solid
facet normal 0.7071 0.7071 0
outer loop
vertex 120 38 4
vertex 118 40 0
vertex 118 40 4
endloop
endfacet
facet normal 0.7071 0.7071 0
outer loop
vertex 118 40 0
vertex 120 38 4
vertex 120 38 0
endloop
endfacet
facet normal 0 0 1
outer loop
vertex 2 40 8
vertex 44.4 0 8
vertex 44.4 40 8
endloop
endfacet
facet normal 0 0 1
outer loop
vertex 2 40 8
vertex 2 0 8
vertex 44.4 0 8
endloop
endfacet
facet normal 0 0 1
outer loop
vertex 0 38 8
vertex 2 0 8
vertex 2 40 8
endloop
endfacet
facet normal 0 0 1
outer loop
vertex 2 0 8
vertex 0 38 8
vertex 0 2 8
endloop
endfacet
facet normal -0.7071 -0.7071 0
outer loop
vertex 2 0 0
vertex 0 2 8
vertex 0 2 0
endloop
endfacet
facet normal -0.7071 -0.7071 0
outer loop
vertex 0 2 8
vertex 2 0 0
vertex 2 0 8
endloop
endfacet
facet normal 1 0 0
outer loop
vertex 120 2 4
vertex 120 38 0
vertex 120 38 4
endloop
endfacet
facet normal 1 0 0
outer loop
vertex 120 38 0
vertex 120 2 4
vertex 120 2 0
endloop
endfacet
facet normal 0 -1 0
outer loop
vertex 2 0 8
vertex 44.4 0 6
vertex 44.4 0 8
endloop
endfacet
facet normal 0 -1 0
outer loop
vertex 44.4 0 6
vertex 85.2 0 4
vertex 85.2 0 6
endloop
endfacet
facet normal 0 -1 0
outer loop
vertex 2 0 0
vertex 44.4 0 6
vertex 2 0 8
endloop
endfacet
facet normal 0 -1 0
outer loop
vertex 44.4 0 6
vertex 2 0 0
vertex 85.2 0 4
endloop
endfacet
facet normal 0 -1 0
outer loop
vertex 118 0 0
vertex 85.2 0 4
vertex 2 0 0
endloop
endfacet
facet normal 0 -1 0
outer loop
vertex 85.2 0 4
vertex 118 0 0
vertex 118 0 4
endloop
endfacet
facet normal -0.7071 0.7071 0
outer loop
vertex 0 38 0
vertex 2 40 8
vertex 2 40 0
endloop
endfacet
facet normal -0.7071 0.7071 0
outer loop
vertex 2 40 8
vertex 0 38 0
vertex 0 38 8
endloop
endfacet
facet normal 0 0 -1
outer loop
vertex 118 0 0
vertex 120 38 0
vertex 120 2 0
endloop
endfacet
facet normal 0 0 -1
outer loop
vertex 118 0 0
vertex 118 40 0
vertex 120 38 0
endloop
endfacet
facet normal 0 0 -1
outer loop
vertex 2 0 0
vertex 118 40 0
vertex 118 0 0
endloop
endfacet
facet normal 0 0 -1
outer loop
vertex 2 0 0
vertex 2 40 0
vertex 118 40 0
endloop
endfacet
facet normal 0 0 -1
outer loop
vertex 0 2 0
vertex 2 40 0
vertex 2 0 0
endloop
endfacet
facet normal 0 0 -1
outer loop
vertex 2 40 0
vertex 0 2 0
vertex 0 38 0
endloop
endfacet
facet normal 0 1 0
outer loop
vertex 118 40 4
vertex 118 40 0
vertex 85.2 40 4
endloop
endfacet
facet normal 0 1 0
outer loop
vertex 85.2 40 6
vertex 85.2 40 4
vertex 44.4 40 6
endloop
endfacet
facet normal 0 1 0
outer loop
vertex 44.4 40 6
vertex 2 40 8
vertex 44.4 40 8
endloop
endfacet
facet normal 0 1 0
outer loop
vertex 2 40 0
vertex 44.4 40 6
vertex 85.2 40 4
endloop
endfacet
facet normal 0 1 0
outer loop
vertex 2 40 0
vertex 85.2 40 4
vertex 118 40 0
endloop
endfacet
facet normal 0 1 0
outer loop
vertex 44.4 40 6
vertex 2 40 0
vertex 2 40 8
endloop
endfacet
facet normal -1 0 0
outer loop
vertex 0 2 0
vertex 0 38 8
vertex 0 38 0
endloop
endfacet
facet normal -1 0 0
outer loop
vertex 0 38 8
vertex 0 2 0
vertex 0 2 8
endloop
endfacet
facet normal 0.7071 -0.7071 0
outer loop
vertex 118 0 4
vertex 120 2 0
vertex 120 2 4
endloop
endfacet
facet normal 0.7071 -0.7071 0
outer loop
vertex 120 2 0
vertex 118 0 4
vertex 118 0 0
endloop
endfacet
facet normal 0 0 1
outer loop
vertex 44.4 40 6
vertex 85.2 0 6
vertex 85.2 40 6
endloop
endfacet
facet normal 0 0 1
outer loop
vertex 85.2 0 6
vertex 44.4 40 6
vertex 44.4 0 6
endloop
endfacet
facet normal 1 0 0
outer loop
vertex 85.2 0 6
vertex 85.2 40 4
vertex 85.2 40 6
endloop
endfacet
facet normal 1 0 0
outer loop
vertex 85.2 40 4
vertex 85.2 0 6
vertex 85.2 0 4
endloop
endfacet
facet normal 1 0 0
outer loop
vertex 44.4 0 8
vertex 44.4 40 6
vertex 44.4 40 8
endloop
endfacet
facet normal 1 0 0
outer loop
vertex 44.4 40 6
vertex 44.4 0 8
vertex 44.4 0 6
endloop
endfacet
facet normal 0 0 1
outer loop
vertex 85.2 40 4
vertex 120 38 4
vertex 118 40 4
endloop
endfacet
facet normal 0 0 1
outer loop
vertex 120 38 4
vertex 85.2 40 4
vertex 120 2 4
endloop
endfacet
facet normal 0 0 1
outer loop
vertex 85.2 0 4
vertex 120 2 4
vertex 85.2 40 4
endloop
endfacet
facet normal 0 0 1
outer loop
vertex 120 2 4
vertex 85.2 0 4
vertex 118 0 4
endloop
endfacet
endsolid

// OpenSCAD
$fn = 32;

// ----------------------------------------------------------------------
// Stepped bar: twostep, 120 x 40 x 8/4 mm
// ----------------------------------------------------------------------

// --- parameters (mm) ---
bar_l = 120;              // bar length, X
bar_w = 40;               // bar width, Y
plate_t = 8;              // thickness of the thick zone, Z
thin_t = 4;               // thickness of the thin zone
corner_c = 2;             // corner chamfer of the bar
step_cut = 4;             // material removed from the thin zone
stair1_x = 44.4;          // position of the first stair
stair2_x = 85.2;          // position of the second stair
mid_t = 6;                // thickness of the middle zone
depth_1 = 2;              // depth of cut 1 from the top face
depth_2 = 4;              // depth of cut 2 from the top face

profile = [[2, 0], [118, 0], [120, 2], [120, 38], [118, 40], [2, 40], [0, 38], [0, 2]];  // primary outline, 8 points, counter clockwise
void_1 = [[44.4, -1], [85.2, -1], [85.2, 41], [44.4, 41]];  // first stair, 4 points
void_2 = [[85.2, -1], [121, -1], [121, 41], [85.2, 41]];  // second stair, 4 points

// --- the one profile operation ---
difference() {
  linear_extrude(height = plate_t) polygon(points = profile);
  translate([0, 0, plate_t - depth_1])
    linear_extrude(height = depth_1 + 1) polygon(points = void_1);
  translate([0, 0, plate_t - depth_2])
    linear_extrude(height = depth_2 + 1) polygon(points = void_2);
}
